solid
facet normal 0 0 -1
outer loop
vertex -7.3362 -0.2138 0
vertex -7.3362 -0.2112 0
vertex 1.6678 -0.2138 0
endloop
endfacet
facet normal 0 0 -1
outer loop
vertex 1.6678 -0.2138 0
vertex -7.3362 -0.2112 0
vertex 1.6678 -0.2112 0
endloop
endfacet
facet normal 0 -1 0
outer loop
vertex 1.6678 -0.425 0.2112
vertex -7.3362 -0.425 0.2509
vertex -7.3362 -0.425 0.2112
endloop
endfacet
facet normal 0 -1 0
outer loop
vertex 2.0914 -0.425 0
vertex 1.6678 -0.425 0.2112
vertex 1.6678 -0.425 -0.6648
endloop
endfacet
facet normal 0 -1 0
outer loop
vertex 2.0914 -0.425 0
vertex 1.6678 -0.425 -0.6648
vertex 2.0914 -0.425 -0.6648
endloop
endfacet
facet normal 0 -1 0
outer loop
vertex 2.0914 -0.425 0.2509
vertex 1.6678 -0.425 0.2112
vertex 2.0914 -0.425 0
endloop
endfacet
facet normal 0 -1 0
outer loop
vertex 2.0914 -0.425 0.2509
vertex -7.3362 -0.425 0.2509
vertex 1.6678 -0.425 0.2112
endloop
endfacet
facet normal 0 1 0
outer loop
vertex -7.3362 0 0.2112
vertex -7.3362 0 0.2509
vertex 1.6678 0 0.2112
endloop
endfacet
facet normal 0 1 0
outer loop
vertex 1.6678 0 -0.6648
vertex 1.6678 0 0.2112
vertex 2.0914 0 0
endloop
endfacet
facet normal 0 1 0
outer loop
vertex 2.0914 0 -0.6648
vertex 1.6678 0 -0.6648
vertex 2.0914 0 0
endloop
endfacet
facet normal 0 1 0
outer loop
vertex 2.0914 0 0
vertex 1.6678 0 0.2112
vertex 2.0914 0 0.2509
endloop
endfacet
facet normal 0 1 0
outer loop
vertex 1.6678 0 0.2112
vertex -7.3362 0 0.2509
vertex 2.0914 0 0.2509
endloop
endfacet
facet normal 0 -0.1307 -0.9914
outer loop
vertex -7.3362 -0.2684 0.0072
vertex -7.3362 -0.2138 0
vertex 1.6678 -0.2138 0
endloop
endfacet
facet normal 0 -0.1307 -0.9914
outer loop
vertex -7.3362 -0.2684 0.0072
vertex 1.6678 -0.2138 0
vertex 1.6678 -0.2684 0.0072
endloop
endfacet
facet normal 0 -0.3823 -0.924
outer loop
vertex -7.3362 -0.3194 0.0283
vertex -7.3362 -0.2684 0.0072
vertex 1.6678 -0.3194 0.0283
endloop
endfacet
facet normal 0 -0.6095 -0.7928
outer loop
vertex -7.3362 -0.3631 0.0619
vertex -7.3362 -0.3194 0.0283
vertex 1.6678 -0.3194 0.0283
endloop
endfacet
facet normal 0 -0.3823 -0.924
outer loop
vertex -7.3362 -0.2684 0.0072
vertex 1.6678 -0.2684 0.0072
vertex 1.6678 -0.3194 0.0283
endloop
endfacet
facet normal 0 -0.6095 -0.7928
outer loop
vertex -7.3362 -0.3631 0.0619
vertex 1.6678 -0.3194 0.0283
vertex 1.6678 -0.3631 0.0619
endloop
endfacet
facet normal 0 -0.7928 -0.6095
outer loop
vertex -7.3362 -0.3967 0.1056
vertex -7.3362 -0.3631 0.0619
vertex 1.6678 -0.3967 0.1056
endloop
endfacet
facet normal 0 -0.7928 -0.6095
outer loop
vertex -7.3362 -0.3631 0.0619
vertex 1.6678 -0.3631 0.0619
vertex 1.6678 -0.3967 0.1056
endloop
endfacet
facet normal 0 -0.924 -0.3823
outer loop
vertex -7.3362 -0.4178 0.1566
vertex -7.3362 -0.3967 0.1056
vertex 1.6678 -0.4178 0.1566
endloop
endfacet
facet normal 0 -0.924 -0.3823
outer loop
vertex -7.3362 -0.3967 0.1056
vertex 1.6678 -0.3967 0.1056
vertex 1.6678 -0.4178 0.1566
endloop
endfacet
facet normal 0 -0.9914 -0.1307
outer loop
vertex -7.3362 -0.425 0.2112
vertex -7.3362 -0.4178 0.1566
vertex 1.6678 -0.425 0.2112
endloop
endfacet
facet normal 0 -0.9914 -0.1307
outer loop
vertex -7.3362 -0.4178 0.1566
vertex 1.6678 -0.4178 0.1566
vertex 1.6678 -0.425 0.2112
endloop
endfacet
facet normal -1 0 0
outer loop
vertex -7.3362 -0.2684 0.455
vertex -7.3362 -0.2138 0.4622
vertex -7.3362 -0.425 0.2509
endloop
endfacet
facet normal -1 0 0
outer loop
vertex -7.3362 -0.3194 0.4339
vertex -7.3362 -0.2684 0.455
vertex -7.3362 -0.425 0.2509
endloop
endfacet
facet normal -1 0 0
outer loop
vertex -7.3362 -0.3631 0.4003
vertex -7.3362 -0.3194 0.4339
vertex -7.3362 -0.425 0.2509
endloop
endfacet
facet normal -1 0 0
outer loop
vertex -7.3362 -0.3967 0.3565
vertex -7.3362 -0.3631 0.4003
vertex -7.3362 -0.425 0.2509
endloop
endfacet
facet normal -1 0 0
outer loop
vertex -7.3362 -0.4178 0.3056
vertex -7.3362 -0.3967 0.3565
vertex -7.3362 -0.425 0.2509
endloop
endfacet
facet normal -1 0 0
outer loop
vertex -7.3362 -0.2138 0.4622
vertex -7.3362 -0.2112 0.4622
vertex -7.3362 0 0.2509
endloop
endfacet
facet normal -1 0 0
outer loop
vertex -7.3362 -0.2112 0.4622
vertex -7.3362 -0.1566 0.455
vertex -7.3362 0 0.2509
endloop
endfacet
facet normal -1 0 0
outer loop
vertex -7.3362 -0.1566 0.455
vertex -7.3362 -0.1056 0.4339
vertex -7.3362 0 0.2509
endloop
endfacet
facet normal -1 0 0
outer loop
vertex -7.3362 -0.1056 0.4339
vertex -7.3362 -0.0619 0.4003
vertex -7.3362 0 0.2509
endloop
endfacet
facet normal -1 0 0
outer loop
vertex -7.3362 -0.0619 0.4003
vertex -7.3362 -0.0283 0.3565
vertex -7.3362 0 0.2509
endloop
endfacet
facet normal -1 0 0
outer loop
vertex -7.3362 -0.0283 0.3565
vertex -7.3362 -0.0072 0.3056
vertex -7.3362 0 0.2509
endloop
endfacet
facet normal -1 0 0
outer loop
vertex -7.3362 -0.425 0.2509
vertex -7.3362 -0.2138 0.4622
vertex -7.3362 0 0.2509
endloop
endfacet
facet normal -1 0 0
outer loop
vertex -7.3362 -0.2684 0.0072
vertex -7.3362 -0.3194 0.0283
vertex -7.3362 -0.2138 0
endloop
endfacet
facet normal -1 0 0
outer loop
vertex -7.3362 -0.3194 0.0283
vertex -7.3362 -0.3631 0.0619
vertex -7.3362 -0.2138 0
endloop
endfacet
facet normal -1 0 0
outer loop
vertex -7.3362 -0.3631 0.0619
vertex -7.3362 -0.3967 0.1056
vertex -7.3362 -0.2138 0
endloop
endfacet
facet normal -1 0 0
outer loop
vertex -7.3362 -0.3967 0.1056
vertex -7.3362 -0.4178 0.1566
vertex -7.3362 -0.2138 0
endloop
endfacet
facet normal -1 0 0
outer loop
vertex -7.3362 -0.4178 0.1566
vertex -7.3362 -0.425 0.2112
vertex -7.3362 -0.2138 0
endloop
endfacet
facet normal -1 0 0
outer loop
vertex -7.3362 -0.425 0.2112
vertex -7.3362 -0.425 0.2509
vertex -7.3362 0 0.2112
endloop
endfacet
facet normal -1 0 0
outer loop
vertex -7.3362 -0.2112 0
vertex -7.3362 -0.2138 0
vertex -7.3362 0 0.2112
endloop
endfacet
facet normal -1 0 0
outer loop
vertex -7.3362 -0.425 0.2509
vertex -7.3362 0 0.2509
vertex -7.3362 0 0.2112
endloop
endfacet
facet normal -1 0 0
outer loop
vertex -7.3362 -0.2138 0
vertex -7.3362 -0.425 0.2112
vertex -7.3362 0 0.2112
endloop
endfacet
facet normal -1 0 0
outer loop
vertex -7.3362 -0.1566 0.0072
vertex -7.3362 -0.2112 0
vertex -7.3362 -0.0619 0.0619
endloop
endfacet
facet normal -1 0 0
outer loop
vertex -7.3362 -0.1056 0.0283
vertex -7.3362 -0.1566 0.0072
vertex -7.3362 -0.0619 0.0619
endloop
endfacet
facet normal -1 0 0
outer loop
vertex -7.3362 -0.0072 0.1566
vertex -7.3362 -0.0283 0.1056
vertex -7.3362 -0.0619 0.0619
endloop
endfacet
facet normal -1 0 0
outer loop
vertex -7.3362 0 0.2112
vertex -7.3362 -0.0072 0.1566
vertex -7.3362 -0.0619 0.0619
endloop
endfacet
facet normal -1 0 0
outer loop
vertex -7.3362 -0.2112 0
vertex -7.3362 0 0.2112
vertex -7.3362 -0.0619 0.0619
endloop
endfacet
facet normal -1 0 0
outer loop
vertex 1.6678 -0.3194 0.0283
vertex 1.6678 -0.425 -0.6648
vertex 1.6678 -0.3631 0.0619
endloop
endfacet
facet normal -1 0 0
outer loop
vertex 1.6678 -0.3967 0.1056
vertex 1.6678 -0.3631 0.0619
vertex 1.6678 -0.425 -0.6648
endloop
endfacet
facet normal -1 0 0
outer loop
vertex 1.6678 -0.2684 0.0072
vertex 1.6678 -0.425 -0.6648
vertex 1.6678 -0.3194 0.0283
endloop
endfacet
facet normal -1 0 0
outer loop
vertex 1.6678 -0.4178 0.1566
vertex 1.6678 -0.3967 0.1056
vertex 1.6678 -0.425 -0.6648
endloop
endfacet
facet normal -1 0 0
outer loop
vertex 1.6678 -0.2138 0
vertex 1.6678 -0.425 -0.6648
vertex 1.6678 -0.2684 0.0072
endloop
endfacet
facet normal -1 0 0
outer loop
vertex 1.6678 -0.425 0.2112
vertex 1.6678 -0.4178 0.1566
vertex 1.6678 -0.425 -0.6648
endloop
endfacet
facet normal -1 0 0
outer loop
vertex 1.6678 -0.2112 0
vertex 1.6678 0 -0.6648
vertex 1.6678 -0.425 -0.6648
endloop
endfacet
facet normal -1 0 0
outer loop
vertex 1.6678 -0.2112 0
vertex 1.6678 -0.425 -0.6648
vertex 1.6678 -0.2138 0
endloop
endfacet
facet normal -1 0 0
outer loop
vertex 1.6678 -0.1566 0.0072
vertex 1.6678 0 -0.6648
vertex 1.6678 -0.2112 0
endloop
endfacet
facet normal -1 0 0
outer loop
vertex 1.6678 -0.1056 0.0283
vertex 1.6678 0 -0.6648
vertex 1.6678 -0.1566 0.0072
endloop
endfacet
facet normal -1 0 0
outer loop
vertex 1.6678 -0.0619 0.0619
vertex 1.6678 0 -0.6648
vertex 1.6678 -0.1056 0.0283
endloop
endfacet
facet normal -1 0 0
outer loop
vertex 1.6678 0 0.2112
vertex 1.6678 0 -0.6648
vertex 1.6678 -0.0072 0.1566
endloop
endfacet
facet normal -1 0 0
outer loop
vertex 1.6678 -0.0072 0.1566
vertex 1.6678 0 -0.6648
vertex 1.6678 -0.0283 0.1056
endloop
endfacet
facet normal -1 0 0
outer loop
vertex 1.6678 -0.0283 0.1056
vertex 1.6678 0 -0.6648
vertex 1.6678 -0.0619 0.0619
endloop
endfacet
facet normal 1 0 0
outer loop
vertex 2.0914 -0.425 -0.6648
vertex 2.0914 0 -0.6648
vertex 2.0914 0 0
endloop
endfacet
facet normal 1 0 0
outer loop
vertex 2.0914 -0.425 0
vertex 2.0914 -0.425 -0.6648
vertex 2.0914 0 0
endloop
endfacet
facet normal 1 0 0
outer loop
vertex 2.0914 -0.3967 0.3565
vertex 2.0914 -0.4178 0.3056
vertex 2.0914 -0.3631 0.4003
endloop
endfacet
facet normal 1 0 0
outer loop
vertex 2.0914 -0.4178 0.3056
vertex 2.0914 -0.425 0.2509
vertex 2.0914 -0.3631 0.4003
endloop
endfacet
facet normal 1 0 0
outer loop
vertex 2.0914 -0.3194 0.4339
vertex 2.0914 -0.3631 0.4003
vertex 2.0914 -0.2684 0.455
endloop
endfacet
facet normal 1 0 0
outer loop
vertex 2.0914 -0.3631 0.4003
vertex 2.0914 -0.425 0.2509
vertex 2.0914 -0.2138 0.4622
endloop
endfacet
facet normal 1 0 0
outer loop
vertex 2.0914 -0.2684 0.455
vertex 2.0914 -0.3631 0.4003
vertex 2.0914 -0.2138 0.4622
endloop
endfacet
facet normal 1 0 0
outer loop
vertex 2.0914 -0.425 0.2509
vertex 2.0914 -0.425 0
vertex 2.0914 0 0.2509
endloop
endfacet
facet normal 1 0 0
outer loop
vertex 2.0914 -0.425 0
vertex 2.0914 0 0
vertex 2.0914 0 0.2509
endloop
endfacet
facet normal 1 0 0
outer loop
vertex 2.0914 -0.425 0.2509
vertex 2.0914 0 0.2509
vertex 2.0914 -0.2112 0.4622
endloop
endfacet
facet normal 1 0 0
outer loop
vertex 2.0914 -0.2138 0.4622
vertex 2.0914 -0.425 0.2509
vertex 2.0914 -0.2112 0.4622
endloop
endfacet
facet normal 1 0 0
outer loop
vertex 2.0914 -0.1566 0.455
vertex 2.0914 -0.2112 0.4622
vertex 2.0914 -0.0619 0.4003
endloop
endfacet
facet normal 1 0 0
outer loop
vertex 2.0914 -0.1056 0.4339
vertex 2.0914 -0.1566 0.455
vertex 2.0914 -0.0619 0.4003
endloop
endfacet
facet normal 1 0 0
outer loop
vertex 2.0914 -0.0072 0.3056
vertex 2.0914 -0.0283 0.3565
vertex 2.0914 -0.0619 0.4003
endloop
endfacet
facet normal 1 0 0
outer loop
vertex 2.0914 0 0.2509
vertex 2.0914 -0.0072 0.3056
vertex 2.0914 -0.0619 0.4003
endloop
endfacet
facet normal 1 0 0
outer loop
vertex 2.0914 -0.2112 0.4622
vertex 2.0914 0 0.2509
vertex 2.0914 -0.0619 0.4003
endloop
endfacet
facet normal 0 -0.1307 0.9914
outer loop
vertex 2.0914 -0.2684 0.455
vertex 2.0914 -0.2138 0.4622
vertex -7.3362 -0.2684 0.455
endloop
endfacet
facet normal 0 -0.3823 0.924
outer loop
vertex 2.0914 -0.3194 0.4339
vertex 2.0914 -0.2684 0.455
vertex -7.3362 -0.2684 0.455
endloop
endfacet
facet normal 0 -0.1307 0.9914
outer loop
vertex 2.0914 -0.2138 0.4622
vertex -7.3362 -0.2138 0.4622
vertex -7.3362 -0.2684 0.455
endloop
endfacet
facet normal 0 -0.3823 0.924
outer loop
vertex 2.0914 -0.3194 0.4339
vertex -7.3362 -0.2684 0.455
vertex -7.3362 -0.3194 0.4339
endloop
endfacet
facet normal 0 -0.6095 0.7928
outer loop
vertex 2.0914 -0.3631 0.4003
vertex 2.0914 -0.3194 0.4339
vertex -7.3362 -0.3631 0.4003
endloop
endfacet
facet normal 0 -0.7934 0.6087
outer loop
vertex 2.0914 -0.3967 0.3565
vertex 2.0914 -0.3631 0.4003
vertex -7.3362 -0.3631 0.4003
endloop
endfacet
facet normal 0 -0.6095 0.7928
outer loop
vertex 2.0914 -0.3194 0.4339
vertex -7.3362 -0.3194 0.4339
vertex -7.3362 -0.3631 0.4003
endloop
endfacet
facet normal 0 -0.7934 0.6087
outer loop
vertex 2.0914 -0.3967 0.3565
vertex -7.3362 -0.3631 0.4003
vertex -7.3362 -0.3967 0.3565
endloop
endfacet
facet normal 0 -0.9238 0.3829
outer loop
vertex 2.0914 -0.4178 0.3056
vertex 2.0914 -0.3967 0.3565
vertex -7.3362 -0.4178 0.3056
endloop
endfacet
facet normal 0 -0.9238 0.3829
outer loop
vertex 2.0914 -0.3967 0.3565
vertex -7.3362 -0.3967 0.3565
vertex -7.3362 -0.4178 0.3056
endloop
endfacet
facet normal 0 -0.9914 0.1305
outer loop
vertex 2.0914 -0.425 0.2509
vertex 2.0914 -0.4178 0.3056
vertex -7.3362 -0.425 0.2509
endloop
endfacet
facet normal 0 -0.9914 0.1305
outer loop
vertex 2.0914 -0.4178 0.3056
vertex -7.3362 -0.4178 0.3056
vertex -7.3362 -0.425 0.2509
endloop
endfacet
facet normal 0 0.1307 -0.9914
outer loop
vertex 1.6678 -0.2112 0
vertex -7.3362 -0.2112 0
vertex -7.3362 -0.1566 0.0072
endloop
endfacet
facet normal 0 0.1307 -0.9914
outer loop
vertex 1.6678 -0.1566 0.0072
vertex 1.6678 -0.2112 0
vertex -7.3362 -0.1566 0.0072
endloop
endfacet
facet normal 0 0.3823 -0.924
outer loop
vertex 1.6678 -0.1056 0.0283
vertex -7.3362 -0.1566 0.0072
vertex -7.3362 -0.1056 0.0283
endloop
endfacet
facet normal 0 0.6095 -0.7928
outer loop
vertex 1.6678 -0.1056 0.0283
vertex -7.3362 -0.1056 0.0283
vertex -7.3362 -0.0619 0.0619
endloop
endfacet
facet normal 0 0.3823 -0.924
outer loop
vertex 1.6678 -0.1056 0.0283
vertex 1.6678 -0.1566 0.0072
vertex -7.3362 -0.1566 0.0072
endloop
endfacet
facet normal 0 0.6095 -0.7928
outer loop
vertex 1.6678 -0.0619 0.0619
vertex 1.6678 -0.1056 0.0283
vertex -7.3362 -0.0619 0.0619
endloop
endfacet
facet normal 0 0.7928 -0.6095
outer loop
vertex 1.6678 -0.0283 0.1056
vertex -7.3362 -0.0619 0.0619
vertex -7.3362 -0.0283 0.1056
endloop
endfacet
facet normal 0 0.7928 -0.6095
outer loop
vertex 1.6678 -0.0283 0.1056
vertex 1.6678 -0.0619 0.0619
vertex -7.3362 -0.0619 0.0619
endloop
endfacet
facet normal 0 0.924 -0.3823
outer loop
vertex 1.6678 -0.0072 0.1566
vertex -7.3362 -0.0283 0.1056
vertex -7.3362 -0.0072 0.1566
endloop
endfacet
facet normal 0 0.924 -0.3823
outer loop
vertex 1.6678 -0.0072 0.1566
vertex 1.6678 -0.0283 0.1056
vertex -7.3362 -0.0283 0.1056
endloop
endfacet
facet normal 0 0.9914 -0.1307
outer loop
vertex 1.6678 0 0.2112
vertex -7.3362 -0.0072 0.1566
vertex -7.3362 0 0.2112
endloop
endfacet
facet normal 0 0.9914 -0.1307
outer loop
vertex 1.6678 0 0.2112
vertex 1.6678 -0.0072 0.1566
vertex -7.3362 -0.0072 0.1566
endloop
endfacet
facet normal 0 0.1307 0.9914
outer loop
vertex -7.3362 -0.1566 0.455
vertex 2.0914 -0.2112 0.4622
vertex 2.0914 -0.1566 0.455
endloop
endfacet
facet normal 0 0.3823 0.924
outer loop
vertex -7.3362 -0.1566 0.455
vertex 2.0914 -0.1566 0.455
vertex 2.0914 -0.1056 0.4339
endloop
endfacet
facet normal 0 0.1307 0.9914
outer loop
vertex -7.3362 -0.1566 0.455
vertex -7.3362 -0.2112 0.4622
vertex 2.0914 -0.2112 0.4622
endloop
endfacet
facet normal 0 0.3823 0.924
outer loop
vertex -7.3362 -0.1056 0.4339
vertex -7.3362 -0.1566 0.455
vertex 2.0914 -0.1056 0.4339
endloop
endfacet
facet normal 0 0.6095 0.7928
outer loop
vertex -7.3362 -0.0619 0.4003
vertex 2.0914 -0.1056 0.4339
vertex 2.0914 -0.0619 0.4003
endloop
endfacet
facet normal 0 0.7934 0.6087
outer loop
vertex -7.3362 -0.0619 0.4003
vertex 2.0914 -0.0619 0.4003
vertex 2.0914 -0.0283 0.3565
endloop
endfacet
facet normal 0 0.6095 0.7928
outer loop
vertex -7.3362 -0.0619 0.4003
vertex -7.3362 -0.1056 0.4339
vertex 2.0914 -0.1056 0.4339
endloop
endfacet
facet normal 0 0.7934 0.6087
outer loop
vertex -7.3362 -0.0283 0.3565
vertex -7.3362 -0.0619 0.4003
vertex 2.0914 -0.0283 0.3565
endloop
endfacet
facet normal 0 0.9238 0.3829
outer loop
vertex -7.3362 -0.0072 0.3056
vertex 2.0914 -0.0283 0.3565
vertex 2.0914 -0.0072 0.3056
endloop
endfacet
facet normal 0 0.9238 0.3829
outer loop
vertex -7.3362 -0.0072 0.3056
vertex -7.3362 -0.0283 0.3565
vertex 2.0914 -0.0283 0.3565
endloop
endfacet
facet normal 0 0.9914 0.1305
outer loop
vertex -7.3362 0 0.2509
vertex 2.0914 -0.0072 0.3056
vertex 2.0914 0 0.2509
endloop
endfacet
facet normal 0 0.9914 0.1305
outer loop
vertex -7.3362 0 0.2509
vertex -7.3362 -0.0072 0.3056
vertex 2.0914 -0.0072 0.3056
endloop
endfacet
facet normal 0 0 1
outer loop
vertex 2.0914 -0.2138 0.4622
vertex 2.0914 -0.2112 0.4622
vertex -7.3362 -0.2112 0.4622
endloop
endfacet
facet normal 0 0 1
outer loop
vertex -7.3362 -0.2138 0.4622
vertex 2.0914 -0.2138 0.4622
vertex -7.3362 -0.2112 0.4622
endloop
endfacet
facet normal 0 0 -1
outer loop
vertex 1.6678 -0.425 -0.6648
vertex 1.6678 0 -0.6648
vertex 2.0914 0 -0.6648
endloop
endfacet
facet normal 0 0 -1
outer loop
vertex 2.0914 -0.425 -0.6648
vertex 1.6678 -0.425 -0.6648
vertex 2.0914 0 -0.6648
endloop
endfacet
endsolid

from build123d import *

# Parameters (mm, degrees)
F0_W     = 3.3884318545
F0_H     = 5.3184241988
F1_DEPTH = 3.4
F2_R     = 1.6899494937
F3_SCALE = 0.125


with BuildPart() as f1:
    # F0 (on Front) → F1 (new body)
    with BuildSketch(Plane.XZ):
        Polygon((16.7311448604, 3.6973168608), (-58.6892813444, 3.6973168608), (-58.6892813444, 0), (13.3427130058, 0), (16.7311448604, 0), align=None)
        with Locations((15.0369289331, -2.6592120994)):
            Rectangle(F0_W, F0_H)
    extrude(amount=F1_DEPTH)

    # F2
    f2_edges = [f1.edges().sort_by_distance(p)[0] for p in [
        (-20.979068, -3.4, 3.697317),
        (-20.979068, 0, 3.697317),
        (-22.673284, -3.4, 0),
        (-22.673284, 0, 0),
    ]]
    fillet(f2_edges, radius=F2_R)


with BuildPart() as f1_1:
    # F3: moved
    add(f1.part.scale(F3_SCALE))


solid = f1_1.part
